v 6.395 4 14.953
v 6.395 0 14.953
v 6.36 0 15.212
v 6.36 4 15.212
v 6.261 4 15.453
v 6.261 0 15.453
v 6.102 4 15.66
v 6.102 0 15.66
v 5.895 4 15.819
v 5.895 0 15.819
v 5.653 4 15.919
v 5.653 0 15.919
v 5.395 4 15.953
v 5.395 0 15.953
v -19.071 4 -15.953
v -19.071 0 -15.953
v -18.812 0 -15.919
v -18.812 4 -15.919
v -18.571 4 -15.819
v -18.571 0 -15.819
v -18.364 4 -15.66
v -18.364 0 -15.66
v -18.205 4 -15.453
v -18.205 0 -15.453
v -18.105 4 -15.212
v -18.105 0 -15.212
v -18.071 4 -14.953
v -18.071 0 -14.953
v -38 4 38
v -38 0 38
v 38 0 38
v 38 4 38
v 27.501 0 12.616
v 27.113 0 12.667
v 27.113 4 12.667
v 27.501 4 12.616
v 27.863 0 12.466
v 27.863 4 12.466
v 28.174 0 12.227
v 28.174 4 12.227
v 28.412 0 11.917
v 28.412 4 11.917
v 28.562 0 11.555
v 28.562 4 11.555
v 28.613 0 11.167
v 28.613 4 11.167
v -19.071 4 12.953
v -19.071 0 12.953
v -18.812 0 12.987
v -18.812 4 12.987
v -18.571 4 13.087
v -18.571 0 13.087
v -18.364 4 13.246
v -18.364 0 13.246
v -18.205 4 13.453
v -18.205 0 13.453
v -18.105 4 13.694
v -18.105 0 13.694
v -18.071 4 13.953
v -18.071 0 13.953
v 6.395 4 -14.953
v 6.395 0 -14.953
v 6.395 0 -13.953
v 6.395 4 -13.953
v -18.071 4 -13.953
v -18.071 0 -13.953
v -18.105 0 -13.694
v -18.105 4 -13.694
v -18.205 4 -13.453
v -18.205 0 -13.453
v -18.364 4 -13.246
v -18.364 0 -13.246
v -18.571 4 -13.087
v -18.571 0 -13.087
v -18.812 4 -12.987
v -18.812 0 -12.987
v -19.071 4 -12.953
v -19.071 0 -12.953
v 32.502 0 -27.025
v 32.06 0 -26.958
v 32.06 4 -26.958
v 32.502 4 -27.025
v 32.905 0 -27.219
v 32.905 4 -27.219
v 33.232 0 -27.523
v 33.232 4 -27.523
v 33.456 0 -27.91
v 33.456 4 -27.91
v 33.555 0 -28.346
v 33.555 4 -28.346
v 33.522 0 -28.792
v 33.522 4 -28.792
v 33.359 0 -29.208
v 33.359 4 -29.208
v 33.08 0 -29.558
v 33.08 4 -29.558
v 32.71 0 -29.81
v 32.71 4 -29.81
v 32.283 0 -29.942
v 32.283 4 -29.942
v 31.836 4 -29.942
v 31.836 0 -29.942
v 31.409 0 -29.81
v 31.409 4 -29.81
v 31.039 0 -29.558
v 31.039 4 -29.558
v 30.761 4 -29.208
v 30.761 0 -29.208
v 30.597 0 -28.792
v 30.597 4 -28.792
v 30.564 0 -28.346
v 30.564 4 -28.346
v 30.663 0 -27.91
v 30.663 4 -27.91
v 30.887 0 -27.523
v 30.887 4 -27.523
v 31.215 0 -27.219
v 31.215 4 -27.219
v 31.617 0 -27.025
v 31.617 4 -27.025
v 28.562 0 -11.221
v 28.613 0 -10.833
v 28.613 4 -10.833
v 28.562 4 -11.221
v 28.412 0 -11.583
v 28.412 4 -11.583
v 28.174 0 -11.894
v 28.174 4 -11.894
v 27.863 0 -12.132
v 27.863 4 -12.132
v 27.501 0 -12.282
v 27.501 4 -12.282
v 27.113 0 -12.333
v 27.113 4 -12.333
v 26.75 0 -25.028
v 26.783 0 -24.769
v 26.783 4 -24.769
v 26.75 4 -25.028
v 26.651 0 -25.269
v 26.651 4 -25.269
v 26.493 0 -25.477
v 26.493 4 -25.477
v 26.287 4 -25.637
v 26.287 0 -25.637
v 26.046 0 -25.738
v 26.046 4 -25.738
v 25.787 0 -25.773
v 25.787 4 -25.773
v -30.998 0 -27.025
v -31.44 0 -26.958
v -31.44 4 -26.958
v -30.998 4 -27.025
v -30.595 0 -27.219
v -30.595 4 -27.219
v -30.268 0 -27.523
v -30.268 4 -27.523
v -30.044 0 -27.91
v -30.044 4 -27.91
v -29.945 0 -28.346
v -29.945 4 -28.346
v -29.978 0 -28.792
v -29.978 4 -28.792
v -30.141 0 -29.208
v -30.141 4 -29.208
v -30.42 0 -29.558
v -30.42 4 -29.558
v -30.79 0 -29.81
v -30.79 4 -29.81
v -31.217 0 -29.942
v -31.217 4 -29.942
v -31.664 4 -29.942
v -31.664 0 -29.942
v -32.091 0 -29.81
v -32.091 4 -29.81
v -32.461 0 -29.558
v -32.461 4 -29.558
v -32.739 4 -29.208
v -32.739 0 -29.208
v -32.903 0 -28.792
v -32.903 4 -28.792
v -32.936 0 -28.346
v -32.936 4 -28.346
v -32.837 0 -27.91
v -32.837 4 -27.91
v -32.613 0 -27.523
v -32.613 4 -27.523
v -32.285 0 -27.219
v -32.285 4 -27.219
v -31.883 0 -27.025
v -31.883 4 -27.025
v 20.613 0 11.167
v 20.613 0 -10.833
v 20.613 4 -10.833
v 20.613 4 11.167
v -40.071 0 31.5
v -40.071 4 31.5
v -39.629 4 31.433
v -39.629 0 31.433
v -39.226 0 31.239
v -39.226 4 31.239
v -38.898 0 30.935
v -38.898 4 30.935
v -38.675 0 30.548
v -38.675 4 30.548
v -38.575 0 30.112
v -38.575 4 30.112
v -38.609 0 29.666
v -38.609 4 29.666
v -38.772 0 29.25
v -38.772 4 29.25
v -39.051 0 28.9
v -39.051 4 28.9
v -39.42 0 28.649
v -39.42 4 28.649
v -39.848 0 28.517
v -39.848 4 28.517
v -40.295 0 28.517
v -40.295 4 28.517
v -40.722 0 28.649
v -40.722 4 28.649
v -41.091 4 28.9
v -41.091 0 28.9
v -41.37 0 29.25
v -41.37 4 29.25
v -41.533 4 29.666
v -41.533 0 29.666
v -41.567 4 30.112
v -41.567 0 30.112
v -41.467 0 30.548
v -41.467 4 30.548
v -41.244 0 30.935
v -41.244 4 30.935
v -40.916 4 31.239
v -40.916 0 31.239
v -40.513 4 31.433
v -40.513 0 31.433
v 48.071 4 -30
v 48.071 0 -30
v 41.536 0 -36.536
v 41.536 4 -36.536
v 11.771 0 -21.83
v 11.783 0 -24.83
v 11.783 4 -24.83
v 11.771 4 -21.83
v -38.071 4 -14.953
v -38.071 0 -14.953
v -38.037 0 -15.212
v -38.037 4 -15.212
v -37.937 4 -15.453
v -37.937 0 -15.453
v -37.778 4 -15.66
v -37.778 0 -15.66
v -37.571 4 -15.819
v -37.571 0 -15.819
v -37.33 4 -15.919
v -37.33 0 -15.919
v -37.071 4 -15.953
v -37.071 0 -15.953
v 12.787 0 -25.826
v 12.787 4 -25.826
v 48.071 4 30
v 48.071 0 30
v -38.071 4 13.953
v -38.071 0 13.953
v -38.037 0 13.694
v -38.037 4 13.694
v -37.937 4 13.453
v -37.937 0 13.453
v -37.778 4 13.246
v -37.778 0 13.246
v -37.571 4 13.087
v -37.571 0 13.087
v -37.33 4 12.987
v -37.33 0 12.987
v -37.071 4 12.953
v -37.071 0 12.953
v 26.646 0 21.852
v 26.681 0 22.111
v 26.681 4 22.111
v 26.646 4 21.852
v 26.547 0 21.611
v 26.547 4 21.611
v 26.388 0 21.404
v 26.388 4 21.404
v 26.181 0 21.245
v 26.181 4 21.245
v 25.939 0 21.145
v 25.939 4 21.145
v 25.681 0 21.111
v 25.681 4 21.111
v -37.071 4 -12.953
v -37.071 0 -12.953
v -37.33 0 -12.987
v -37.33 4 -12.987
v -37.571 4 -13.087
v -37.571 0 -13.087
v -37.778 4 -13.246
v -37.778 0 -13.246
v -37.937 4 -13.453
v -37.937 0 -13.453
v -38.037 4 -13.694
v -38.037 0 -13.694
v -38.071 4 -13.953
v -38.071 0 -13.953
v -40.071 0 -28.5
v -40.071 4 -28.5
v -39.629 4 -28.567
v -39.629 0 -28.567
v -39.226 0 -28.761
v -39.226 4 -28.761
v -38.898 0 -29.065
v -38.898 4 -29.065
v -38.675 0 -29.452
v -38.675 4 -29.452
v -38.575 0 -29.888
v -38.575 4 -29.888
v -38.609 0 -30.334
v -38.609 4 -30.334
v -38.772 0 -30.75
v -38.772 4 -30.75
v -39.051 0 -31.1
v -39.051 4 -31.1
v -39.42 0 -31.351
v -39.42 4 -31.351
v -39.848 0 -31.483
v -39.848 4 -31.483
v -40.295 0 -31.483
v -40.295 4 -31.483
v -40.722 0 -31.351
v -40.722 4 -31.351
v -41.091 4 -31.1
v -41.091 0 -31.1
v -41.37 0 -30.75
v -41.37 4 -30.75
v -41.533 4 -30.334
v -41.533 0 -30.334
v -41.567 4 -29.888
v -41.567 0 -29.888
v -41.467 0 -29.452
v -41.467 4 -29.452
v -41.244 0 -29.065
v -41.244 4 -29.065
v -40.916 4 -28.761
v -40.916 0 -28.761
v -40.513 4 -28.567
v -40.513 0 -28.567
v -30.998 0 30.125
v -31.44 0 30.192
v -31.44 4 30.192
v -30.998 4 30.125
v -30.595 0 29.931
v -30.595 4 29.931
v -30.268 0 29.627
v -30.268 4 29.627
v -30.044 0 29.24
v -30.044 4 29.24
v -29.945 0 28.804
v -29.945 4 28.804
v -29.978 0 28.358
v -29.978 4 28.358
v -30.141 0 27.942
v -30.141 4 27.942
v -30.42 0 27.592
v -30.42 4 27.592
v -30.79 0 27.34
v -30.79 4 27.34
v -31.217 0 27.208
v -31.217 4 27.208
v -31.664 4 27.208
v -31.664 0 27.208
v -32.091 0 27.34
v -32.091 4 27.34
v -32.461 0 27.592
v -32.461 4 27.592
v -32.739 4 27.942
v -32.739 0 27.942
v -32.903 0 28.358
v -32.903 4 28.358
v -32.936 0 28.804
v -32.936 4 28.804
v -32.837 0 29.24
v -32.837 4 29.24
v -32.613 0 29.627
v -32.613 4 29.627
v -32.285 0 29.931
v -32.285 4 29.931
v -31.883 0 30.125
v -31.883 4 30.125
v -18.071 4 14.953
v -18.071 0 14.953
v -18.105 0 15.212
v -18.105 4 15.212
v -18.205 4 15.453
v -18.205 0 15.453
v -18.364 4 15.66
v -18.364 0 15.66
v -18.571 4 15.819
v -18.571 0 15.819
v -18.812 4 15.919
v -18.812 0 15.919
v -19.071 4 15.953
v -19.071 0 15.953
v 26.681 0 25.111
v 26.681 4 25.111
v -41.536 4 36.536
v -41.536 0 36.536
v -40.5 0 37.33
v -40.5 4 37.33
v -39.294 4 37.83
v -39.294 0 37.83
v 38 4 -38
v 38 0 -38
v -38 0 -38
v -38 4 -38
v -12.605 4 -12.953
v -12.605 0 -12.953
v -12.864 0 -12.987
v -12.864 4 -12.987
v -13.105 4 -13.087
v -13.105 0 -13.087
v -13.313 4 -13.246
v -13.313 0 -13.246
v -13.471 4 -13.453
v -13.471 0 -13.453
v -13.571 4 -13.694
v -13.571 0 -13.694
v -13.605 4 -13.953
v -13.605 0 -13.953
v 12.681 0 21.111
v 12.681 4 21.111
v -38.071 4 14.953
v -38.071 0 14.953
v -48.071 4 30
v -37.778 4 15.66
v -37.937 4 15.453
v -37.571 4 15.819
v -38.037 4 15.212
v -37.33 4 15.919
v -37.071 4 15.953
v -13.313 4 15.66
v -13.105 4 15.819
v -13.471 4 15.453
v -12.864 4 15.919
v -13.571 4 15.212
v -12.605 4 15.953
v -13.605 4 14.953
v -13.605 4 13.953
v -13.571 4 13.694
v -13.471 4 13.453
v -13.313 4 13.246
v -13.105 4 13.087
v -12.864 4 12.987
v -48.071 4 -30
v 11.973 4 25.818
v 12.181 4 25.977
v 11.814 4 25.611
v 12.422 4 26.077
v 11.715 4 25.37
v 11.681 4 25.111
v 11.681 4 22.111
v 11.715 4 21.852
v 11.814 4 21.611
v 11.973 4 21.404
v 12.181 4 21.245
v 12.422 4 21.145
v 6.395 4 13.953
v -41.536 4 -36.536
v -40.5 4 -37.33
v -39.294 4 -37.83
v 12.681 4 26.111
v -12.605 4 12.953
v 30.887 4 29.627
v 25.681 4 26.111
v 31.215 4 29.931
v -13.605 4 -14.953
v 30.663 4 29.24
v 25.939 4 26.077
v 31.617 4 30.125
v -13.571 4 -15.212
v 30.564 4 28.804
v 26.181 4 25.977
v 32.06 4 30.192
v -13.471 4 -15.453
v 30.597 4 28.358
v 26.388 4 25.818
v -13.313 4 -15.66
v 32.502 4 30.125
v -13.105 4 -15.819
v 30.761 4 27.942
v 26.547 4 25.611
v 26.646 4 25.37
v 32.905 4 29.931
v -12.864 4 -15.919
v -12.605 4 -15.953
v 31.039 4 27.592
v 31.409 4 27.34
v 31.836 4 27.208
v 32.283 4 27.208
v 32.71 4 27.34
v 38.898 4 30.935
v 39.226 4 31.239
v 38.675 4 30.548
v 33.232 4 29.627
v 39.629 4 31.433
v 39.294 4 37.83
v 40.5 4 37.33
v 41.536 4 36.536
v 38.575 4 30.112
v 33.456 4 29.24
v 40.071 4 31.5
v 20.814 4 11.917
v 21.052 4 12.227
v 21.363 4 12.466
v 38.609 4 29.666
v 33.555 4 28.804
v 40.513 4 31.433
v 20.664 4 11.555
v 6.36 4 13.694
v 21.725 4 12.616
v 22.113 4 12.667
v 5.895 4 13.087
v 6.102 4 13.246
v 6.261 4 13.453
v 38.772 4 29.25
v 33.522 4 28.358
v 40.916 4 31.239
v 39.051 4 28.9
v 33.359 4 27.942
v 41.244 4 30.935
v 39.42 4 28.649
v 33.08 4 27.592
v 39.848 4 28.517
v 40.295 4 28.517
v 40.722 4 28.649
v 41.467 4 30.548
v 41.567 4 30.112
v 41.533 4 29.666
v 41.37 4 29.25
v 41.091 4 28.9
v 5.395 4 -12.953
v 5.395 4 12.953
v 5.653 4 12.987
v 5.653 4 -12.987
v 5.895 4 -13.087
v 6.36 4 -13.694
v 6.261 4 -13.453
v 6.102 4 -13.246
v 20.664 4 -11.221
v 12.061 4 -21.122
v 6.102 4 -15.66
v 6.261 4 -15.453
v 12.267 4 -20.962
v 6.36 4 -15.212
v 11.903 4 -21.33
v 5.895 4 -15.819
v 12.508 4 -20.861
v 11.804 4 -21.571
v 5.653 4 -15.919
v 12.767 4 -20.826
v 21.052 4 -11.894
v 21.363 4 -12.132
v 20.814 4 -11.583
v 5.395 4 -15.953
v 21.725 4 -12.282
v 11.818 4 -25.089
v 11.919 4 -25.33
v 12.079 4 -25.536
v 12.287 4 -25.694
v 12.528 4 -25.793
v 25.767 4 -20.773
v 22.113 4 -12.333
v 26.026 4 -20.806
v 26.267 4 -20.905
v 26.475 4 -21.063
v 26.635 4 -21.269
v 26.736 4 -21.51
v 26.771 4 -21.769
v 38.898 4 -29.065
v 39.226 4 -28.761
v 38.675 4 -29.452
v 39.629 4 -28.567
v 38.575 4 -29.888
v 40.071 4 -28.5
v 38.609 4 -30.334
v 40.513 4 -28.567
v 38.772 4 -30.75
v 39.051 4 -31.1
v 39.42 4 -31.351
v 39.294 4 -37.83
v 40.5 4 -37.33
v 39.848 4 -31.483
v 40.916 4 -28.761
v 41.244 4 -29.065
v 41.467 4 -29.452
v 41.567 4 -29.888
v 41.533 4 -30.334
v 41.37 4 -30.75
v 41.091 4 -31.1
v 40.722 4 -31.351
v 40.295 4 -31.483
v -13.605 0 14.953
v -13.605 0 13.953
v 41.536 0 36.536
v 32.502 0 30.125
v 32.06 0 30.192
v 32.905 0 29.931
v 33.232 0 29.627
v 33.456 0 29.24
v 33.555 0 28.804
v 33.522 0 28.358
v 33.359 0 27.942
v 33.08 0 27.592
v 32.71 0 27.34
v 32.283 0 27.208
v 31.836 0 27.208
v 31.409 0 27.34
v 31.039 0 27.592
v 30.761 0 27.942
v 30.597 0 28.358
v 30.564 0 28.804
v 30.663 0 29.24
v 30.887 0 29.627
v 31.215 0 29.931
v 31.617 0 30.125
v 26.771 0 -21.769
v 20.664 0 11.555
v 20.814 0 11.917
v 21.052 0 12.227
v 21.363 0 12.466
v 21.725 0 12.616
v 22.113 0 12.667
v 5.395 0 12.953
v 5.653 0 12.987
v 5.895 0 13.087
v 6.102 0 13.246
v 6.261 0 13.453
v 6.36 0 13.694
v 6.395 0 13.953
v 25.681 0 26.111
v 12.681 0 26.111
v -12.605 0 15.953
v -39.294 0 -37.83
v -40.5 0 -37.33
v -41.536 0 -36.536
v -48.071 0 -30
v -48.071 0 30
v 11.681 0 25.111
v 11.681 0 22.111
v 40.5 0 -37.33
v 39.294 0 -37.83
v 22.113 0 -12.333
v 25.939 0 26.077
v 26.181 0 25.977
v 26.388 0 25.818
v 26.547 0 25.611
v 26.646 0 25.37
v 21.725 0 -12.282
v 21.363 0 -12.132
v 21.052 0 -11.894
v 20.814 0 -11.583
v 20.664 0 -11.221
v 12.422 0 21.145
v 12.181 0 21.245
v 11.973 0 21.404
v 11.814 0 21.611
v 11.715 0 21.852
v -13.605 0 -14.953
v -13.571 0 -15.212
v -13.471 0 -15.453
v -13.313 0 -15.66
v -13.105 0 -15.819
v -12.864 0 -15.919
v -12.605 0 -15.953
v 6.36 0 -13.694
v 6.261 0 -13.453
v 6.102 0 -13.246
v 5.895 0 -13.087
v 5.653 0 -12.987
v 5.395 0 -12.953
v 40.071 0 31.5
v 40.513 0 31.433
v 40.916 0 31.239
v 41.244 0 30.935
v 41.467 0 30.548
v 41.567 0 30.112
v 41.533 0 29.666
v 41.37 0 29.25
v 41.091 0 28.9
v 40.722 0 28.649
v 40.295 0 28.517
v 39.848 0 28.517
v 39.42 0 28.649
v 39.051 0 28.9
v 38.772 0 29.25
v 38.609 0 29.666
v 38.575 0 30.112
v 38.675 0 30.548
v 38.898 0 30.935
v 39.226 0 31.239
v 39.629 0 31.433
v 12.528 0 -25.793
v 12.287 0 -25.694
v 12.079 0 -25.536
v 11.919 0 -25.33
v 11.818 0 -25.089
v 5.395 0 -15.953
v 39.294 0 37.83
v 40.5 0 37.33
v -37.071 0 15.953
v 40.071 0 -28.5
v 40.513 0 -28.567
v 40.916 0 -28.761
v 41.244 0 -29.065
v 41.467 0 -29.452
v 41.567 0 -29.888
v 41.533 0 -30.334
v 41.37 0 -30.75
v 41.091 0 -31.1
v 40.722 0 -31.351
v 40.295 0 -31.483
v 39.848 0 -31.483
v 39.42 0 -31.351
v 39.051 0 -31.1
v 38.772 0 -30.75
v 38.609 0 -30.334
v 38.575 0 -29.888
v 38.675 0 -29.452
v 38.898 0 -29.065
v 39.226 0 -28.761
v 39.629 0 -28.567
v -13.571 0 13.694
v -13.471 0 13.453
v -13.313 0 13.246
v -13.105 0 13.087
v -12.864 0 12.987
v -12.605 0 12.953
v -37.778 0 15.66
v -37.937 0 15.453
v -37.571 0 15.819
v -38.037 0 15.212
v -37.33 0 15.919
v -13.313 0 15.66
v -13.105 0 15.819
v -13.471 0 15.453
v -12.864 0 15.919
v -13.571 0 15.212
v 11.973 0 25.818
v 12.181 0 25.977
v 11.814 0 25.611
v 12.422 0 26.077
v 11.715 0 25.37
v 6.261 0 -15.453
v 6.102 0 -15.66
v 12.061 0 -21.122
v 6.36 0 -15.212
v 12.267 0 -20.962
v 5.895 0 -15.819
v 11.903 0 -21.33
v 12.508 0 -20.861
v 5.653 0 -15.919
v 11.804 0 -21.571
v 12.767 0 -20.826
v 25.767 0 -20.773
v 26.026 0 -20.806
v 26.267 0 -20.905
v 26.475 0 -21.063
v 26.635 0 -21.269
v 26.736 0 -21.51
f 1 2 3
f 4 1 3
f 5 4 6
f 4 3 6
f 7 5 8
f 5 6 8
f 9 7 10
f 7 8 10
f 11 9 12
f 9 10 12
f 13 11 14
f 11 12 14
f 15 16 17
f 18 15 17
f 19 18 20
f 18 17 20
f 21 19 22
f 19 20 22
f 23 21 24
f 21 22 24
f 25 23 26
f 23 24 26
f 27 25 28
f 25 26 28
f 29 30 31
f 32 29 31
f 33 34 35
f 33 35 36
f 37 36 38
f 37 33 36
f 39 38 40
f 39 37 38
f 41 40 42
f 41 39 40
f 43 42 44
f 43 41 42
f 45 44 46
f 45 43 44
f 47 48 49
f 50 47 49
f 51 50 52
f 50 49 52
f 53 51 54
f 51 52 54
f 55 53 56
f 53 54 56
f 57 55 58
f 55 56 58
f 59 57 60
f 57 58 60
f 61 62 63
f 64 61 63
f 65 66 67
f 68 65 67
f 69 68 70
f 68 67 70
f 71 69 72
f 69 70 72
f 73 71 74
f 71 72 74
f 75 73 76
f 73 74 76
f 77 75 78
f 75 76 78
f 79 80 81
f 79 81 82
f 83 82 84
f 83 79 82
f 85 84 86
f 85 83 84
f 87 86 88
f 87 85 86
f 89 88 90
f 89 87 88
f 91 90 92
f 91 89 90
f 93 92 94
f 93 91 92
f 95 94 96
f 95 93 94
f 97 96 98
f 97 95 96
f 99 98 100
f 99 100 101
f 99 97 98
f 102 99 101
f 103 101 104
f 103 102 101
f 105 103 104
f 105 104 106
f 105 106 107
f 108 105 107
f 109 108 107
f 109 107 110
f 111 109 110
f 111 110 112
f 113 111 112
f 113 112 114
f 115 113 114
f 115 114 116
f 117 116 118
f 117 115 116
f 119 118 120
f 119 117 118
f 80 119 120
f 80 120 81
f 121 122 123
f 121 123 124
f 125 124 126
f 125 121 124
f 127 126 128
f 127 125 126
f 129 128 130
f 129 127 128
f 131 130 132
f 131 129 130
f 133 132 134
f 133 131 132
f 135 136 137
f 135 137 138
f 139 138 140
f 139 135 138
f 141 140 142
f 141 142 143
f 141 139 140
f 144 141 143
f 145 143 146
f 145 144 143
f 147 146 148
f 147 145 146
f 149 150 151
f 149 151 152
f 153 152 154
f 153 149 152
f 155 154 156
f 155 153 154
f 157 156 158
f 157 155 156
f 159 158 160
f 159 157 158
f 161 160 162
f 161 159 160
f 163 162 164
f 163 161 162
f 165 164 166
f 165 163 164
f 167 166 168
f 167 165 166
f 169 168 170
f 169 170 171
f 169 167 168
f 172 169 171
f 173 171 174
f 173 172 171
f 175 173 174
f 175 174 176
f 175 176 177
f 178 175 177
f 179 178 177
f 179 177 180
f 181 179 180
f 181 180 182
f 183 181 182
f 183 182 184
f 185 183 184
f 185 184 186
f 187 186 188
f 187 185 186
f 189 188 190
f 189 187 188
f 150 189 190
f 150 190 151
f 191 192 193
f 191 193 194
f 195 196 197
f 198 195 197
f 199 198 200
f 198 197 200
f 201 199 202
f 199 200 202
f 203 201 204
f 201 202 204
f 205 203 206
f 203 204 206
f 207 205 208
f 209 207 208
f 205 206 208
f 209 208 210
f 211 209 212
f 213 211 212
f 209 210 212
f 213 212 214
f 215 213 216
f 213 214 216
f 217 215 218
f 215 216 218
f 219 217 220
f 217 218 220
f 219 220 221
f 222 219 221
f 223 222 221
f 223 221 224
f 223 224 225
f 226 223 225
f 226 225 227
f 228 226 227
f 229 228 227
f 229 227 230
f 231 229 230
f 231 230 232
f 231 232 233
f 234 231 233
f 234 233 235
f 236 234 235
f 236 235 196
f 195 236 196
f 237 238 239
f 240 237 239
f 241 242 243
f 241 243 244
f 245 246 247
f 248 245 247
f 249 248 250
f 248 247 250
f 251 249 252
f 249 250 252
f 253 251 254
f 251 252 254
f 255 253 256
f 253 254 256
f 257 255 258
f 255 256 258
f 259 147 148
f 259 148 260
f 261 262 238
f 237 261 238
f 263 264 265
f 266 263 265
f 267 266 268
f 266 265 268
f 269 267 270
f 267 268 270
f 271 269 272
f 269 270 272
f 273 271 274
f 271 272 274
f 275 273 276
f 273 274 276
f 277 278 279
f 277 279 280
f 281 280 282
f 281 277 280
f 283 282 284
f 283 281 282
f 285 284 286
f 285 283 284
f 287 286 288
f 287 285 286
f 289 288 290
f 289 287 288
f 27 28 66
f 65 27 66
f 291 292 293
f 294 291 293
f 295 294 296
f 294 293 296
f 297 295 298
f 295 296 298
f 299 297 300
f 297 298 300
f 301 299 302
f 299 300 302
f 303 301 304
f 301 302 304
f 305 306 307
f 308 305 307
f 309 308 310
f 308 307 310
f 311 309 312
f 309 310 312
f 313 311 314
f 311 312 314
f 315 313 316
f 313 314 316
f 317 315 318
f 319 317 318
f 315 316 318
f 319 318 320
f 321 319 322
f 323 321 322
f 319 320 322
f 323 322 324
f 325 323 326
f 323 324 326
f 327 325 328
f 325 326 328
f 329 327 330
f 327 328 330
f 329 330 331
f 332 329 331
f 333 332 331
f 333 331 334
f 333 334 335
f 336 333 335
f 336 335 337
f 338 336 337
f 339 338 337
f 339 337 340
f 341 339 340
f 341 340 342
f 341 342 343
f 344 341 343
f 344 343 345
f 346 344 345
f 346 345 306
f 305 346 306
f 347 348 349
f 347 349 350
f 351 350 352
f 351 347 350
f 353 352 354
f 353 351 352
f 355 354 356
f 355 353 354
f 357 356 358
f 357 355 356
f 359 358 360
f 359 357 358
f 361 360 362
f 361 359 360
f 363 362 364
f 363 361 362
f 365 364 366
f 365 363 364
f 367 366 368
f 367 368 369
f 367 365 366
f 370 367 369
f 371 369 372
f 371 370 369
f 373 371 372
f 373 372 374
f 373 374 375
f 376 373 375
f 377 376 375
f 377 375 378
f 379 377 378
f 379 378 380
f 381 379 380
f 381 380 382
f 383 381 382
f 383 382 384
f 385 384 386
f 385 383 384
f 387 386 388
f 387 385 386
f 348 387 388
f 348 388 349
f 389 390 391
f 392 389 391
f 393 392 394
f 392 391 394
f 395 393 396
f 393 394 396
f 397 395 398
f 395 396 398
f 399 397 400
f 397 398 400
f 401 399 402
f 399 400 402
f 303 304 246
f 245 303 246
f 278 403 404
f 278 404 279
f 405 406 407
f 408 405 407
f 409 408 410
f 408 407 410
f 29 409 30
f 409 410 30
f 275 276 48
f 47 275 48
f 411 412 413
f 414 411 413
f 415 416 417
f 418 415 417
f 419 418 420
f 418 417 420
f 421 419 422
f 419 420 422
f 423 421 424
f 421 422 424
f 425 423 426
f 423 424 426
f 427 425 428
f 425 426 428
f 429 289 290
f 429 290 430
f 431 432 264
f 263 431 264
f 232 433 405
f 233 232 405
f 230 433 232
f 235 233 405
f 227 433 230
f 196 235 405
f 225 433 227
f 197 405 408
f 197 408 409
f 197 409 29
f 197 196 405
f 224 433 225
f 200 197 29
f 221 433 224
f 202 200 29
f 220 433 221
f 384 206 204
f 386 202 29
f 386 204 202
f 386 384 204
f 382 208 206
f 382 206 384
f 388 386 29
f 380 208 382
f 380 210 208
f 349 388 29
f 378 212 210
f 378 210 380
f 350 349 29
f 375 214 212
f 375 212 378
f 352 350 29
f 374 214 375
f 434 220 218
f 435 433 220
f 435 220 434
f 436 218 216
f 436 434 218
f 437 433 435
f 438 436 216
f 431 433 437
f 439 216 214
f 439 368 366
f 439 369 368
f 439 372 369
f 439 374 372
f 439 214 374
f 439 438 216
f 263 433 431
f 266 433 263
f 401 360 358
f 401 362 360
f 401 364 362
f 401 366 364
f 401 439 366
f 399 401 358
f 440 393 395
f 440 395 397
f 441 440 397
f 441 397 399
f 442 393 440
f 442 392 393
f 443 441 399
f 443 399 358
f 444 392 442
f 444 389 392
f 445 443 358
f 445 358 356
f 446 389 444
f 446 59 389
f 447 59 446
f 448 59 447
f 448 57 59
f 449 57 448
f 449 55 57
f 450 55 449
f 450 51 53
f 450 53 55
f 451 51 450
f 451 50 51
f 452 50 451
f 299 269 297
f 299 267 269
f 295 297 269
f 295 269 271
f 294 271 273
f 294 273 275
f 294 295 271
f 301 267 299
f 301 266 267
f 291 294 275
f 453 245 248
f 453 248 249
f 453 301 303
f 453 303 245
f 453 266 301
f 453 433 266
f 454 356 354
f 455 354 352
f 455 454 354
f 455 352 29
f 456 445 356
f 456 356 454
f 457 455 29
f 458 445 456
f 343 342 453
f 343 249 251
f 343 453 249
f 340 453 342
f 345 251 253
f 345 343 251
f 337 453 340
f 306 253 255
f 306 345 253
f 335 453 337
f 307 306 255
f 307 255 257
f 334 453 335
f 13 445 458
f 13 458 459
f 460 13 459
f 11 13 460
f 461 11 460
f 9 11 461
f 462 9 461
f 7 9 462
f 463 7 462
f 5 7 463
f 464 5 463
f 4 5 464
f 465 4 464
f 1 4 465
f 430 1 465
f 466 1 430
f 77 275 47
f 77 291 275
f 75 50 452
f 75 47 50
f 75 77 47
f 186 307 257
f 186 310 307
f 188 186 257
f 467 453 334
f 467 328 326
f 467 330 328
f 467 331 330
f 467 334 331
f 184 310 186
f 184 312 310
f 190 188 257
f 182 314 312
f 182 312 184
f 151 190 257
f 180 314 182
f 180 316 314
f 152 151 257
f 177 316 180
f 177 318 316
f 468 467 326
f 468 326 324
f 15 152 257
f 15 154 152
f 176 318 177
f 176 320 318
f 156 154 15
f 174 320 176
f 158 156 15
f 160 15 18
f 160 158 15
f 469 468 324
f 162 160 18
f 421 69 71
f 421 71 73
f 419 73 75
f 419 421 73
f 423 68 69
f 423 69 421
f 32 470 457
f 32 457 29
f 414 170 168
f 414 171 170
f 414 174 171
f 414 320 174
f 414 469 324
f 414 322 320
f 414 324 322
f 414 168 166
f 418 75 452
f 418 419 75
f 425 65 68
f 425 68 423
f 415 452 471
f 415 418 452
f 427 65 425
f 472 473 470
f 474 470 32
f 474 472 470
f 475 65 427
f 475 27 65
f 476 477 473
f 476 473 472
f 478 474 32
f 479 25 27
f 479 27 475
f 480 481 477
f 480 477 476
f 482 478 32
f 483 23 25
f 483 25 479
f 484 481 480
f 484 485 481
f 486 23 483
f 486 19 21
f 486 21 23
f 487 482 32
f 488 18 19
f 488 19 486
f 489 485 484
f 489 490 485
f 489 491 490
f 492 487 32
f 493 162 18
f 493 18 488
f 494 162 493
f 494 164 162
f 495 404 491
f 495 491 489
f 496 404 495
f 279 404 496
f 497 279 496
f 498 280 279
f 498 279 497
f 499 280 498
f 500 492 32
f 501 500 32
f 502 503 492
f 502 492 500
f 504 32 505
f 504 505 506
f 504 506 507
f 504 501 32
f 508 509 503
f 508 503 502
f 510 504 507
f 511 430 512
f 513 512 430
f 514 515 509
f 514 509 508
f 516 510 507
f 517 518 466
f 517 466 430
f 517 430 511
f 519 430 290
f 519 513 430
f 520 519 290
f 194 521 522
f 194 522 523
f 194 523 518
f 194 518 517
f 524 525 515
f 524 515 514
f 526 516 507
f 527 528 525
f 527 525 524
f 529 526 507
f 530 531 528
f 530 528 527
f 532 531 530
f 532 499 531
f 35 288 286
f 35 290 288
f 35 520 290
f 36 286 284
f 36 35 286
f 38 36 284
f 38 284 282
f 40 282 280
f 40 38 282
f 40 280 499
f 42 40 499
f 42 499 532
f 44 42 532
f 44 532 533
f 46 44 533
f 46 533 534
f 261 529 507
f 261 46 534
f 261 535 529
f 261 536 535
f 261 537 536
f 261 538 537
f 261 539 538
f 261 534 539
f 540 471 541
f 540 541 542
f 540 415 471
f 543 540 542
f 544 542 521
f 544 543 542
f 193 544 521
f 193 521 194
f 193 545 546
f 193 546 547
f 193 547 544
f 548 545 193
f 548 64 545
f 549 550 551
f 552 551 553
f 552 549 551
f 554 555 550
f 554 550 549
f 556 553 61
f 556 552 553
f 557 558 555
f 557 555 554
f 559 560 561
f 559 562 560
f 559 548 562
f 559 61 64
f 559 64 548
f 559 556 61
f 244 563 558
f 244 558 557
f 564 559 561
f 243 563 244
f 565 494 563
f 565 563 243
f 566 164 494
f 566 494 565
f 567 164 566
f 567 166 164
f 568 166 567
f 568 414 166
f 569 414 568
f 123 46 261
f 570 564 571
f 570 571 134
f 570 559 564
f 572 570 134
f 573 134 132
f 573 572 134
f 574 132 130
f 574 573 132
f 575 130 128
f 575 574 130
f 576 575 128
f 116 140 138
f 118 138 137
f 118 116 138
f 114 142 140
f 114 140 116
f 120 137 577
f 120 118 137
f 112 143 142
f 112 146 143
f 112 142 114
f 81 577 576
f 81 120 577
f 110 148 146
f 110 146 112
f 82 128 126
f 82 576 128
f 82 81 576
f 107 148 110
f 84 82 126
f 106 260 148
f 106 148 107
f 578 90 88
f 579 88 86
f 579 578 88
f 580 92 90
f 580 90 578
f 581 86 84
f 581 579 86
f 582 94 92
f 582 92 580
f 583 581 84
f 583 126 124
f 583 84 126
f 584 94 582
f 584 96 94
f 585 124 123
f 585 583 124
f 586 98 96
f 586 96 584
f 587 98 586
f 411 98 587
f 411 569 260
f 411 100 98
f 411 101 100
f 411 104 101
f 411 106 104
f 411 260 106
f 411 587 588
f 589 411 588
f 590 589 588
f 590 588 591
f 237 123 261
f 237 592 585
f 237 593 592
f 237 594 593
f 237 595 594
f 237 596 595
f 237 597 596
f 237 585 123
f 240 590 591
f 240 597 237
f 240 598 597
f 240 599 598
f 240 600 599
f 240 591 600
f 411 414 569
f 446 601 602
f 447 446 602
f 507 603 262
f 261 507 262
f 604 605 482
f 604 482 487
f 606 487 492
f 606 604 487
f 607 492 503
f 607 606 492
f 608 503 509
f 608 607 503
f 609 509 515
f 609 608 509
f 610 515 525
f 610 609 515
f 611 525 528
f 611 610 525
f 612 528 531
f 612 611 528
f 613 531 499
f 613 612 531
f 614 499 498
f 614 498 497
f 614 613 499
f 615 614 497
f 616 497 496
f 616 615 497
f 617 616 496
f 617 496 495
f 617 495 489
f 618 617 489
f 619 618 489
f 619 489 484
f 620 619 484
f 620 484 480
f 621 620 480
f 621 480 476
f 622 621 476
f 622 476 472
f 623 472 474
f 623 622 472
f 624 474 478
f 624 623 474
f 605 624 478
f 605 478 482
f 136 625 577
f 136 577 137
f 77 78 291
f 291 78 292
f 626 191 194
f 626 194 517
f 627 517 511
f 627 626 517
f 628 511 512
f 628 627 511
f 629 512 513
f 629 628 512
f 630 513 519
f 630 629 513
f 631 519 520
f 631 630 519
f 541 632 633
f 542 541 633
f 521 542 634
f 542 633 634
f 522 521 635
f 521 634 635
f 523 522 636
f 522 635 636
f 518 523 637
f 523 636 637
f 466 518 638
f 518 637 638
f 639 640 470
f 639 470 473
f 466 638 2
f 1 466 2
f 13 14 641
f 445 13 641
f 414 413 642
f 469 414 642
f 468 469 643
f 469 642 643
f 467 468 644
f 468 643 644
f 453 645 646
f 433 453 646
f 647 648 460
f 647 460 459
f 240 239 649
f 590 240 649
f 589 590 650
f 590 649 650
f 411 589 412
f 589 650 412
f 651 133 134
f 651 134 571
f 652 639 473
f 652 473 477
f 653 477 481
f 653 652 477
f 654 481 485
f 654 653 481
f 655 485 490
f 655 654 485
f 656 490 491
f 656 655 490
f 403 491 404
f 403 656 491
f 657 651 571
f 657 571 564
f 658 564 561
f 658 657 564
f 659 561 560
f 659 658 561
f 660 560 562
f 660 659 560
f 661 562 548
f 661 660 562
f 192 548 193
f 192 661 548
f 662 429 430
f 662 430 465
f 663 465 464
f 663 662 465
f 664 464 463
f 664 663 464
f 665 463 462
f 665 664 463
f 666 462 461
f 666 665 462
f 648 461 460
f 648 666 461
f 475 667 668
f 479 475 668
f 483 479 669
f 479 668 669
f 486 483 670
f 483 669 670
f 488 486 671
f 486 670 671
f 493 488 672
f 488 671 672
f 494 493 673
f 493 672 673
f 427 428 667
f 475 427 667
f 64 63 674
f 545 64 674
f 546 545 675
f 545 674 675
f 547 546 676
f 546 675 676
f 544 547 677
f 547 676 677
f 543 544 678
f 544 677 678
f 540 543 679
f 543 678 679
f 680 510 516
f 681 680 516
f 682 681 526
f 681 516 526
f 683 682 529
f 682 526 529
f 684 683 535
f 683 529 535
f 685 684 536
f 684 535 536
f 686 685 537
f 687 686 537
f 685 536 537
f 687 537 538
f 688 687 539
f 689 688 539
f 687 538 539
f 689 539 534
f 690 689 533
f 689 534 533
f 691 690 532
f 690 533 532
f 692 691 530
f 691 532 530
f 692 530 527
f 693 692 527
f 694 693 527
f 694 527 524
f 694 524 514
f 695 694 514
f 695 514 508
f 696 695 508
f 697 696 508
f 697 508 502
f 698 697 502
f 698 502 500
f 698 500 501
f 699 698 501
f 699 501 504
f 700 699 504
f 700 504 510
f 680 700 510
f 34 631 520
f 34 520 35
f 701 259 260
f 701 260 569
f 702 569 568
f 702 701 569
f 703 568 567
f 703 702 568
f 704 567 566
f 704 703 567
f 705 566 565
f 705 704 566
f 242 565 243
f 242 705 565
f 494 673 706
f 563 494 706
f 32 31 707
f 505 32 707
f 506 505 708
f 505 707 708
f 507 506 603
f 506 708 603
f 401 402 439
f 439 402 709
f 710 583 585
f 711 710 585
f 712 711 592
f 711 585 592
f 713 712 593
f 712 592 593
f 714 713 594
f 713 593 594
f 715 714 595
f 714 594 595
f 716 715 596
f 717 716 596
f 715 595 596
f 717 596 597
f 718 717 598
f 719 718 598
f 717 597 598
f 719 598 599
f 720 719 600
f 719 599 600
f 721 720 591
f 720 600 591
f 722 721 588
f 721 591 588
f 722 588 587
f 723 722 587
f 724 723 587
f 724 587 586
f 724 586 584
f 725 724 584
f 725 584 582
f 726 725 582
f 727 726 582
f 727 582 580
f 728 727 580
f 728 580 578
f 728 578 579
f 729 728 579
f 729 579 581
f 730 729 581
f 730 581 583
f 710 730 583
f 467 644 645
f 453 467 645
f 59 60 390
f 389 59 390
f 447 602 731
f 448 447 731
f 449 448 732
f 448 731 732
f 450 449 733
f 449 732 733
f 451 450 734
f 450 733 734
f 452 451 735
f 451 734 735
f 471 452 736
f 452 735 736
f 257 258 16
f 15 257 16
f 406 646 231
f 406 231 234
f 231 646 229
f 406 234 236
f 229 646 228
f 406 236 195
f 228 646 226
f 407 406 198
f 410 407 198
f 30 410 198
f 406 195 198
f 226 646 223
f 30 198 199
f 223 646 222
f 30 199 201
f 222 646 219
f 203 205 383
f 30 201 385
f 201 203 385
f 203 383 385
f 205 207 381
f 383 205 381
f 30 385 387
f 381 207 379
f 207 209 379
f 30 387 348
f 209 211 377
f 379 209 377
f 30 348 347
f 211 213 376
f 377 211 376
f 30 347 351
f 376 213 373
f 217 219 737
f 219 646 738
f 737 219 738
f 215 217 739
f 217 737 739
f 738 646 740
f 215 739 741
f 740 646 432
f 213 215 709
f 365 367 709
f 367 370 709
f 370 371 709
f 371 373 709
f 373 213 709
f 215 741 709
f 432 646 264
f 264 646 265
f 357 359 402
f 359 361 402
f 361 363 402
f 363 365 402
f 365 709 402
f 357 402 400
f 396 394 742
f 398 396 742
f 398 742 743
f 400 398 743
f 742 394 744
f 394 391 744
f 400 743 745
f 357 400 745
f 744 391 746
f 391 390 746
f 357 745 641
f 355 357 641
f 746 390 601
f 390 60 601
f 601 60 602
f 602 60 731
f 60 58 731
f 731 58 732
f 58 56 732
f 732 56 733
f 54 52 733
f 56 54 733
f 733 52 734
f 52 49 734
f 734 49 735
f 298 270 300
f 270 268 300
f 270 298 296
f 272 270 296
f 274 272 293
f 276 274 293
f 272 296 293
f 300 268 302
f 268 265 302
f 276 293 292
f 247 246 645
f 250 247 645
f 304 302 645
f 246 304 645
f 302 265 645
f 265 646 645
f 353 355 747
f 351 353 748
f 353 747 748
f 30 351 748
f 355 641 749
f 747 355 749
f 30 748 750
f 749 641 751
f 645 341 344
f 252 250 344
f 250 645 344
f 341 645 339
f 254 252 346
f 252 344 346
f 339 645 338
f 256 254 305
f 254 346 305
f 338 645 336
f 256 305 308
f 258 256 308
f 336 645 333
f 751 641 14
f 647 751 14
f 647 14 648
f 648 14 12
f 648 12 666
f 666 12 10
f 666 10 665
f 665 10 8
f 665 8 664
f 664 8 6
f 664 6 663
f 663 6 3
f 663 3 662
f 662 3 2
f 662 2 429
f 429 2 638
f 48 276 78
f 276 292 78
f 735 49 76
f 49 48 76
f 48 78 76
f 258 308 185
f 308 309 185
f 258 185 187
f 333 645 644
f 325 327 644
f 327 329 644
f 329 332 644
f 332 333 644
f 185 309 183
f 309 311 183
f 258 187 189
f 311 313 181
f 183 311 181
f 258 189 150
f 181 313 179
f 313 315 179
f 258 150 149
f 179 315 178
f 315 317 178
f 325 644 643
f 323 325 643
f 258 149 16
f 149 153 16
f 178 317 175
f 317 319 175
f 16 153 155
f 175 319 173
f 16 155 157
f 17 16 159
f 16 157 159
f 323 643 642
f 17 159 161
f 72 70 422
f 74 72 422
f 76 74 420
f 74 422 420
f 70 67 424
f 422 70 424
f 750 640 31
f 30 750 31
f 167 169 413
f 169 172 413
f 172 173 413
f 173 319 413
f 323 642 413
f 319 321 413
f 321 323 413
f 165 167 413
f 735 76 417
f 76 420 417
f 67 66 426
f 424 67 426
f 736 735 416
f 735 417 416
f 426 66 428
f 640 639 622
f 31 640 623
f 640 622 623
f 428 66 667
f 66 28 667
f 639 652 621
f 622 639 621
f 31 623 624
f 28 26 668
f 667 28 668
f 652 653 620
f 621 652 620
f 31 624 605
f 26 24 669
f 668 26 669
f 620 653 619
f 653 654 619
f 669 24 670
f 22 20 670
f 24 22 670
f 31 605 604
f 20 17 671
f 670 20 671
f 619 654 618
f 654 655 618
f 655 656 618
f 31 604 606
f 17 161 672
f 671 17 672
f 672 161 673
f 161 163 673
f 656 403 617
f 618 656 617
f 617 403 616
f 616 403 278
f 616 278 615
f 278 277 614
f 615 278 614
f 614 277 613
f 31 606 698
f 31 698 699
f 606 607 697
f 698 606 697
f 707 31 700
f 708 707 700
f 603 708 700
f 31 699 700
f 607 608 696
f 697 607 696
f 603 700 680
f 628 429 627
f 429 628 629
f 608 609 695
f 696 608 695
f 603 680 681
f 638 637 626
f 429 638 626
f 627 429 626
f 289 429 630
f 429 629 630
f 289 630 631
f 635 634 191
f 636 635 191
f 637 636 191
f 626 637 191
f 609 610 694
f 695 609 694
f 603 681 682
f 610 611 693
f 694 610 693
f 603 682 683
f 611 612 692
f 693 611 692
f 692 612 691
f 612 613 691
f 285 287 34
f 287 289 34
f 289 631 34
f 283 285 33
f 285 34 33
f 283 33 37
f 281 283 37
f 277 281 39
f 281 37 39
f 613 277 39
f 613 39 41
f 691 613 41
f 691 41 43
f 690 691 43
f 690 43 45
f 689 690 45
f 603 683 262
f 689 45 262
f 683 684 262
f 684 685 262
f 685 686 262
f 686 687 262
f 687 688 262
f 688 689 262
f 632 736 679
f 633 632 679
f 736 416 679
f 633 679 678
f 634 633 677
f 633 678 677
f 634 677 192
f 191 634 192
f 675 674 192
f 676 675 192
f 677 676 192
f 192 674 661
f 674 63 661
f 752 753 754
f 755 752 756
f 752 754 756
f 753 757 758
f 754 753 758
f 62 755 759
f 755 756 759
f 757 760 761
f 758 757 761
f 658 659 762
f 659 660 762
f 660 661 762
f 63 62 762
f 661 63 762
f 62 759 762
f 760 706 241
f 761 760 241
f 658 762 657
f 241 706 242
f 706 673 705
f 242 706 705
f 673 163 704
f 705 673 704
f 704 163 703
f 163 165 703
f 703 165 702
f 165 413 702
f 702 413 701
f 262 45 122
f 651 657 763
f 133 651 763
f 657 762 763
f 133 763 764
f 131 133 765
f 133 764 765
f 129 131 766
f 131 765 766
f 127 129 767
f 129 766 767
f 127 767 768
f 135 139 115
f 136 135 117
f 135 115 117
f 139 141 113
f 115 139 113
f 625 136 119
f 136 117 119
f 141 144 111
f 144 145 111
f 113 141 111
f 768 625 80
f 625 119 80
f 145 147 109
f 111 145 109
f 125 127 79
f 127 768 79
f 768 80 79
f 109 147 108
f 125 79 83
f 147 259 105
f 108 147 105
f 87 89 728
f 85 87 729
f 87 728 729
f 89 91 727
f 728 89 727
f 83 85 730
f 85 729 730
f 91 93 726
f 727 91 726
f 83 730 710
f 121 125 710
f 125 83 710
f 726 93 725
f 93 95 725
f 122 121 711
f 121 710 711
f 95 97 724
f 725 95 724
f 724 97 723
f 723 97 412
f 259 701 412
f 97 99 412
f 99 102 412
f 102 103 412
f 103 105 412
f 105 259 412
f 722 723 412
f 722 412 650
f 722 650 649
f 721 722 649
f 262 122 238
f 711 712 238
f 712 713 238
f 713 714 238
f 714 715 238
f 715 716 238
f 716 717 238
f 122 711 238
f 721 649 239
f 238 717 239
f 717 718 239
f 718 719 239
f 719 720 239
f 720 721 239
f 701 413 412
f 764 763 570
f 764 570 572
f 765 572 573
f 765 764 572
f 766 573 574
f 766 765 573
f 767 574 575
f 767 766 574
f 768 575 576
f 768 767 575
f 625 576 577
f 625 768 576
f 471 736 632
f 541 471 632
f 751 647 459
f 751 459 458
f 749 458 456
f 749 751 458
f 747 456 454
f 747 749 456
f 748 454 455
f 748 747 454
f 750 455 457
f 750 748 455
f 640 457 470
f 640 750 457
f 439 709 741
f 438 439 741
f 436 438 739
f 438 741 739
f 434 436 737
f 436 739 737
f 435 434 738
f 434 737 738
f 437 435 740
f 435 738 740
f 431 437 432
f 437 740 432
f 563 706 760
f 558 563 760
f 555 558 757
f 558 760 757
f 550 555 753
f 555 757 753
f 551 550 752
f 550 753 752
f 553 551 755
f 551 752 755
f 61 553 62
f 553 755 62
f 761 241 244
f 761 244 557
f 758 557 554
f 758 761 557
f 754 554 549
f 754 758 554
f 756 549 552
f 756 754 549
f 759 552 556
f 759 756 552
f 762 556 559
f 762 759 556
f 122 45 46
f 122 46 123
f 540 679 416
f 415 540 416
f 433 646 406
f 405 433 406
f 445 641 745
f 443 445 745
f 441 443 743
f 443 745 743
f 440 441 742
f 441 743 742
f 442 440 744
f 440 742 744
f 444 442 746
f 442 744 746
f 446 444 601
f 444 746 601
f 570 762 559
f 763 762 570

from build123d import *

# Parameters (mm, degrees)
SKETCH1_R           = 1.5
BOSS_EXTRUDE1_DEPTH = 4
SKETCH2_R           = 1.5
CUT_EXTRUDE1_DEPTH  = 10


with BuildPart() as part:
    # Sketch1 → Boss-Extrude1 (new body)
    with BuildSketch(Plane(origin=(0, 0, 0), x_dir=(1, 0, 0), z_dir=(0, 1, 0))):
        with BuildLine():
            Line((-48.071067812, 30), (-48.071067812, -30))
            Line((-48.071067812, -30), (-41.535533906, -36.535533906))
            ThreePointArc((-41.535533906, -36.535533906), (-39.913417162, -37.619397663), (-38, -38))
            Line((-38, -38), (38, -38))
            ThreePointArc((38, -38), (39.913417162, -37.619397663), (41.535533906, -36.535533906))
            Line((41.535533906, -36.535533906), (48.071067812, -30))
            Line((48.071067812, -30), (48.071067812, 30))
            Line((48.071067812, 30), (41.535533906, 36.535533906))
            ThreePointArc((41.535533906, 36.535533906), (39.913417162, 37.619397663), (38, 38))
            Line((38, 38), (-38, 38))
            ThreePointArc((-38, 38), (-39.913417162, 37.619397663), (-41.535533906, 36.535533906))
            Line((-41.535533906, 36.535533906), (-48.071067812, 30))
        make_face()
        with Locations(Location((32.059596398, -28.691611003, 0), (0, 0, 270))):
            Circle(SKETCH1_R, mode=Mode.SUBTRACT)
        with Locations(Location((32.059596398, 28.458388997, 0), (0, 0, 270))):
            Circle(SKETCH1_R, mode=Mode.SUBTRACT)
        with Locations(Location((-31.440403602, -28.691611003, 0), (0, 0, 270))):
            Circle(SKETCH1_R, mode=Mode.SUBTRACT)
        with Locations(Location((-31.440403602, 28.458388997, 0), (0, 0, 270))):
            Circle(SKETCH1_R, mode=Mode.SUBTRACT)
        with BuildLine():
            Line((26.770818028, 21.768665175), (26.783167828, 24.768639755))
            ThreePointArc((26.783167828, 24.768639755), (26.493187967, 25.476946269), (25.787292902, 25.772747882))
            Line((25.787292902, 25.772747882), (12.787403054, 25.826263684))
            ThreePointArc((12.787403054, 25.826263684), (12.07909654, 25.536283823), (11.783294927, 24.830388757))
            Line((11.783294927, 24.830388757), (11.770945126, 21.830414177))
            ThreePointArc((11.770945126, 21.830414177), (12.060924988, 21.122107663), (12.766820053, 20.82630605))
            Line((12.766820053, 20.82630605), (25.766709901, 20.772790248))
            ThreePointArc((25.766709901, 20.772790248), (26.475016415, 21.062770109), (26.770818028, 21.768665175))
        make_face(mode=Mode.SUBTRACT)
        with BuildLine():
            Line((28.613064126, -11.166765747), (28.613064126, 10.833234253))
            ThreePointArc((28.613064126, 10.833234253), (28.173724298, 11.893894425), (27.113064126, 12.333234253))
            Line((27.113064126, 12.333234253), (22.113064126, 12.333234253))
            ThreePointArc((22.113064126, 12.333234253), (21.052403954, 11.893894425), (20.613064126, 10.833234253))
            Line((20.613064126, 10.833234253), (20.613064126, -11.166765747))
            ThreePointArc((20.613064126, -11.166765747), (21.052403954, -12.227425919), (22.113064126, -12.666765747))
            Line((22.113064126, -12.666765747), (27.113064126, -12.666765747))
            ThreePointArc((27.113064126, -12.666765747), (28.173724298, -12.227425919), (28.613064126, -11.166765747))
        make_face(mode=Mode.SUBTRACT)
        with BuildLine():
            Line((26.680500347, -25.110893415), (26.680500347, -22.110893415))
            ThreePointArc((26.680500347, -22.110893415), (26.387607128, -21.403786634), (25.680500347, -21.110893415))
            Line((25.680500347, -21.110893415), (12.680500347, -21.110893415))
            ThreePointArc((12.680500347, -21.110893415), (11.973393565, -21.403786634), (11.680500347, -22.110893415))
            Line((11.680500347, -22.110893415), (11.680500347, -25.110893415))
            ThreePointArc((11.680500347, -25.110893415), (11.973393565, -25.818000196), (12.680500347, -26.110893415))
            Line((12.680500347, -26.110893415), (25.680500347, -26.110893415))
            ThreePointArc((25.680500347, -26.110893415), (26.387607128, -25.818000196), (26.680500347, -25.110893415))
        make_face(mode=Mode.SUBTRACT)
        with BuildLine():
            Line((-37.071067812, 15.952856913), (-19.071067812, 15.952856913))
            ThreePointArc((-19.071067812, 15.952856913), (-18.363961031, 15.659963694), (-18.071067812, 14.952856913))
            Line((-18.071067812, 14.952856913), (-18.071067812, 13.952856913))
            ThreePointArc((-18.071067812, 13.952856913), (-18.363961031, 13.245750131), (-19.071067812, 12.952856913))
            Line((-19.071067812, 12.952856913), (-37.071067812, 12.952856913))
            ThreePointArc((-37.071067812, 12.952856913), (-37.778174593, 13.245750131), (-38.071067812, 13.952856913))
            Line((-38.071067812, 13.952856913), (-38.071067812, 14.952856913))
            ThreePointArc((-38.071067812, 14.952856913), (-37.778174593, 15.659963694), (-37.071067812, 15.952856913))
        make_face(mode=Mode.SUBTRACT)
        with BuildLine():
            Line((6.394530071, 14.952856913), (6.394530071, 13.952856913))
            ThreePointArc((6.394530071, 13.952856913), (6.101636852, 13.245750131), (5.394530071, 12.952856913))
            Line((5.394530071, 12.952856913), (-12.605469929, 12.952856913))
            ThreePointArc((-12.605469929, 12.952856913), (-13.312576711, 13.245750131), (-13.605469929, 13.952856913))
            Line((-13.605469929, 13.952856913), (-13.605469929, 14.952856913))
            ThreePointArc((-13.605469929, 14.952856913), (-13.312576711, 15.659963694), (-12.605469929, 15.952856913))
            Line((-12.605469929, 15.952856913), (5.394530071, 15.952856913))
            ThreePointArc((5.394530071, 15.952856913), (6.101636852, 15.659963694), (6.394530071, 14.952856913))
        make_face(mode=Mode.SUBTRACT)
        with BuildLine():
            Line((-38.071067812, -14.952856913), (-38.071067812, -13.952856913))
            ThreePointArc((-38.071067812, -13.952856913), (-37.778174593, -13.245750131), (-37.071067812, -12.952856913))
            Line((-37.071067812, -12.952856913), (-19.071067812, -12.952856913))
            ThreePointArc((-19.071067812, -12.952856913), (-18.363961031, -13.245750131), (-18.071067812, -13.952856913))
            Line((-18.071067812, -13.952856913), (-18.071067812, -14.952856913))
            ThreePointArc((-18.071067812, -14.952856913), (-18.363961031, -15.659963694), (-19.071067812, -15.952856913))
            Line((-19.071067812, -15.952856913), (-37.071067812, -15.952856913))
            ThreePointArc((-37.071067812, -15.952856913), (-37.778174593, -15.659963694), (-38.071067812, -14.952856913))
        make_face(mode=Mode.SUBTRACT)
        with BuildLine():
            Line((-13.605469929, -14.952856913), (-13.605469929, -13.952856913))
            ThreePointArc((-13.605469929, -13.952856913), (-13.312576711, -13.245750131), (-12.605469929, -12.952856913))
            Line((-12.605469929, -12.952856913), (5.394530071, -12.952856913))
            ThreePointArc((5.394530071, -12.952856913), (6.101636852, -13.245750131), (6.394530071, -13.952856913))
            Line((6.394530071, -13.952856913), (6.394530071, -14.952856913))
            ThreePointArc((6.394530071, -14.952856913), (6.101636852, -15.659963694), (5.394530071, -15.952856913))
            Line((5.394530071, -15.952856913), (-12.605469929, -15.952856913))
            ThreePointArc((-12.605469929, -15.952856913), (-13.312576711, -15.659963694), (-13.605469929, -14.952856913))
        make_face(mode=Mode.SUBTRACT)
    extrude(amount=BOSS_EXTRUDE1_DEPTH)

    # Sketch2 → Cut-Extrude1 (cut)
    with BuildSketch(Plane(origin=(0, 4, 0), x_dir=(1, 0, 0), z_dir=(0, 1, 0))):
        with Locations(Location((-40.071067812, 30, 0), (0, 0, 270))):
            Circle(SKETCH2_R)
        with Locations(Location((40.071067812, 30, 0), (0, 0, 270))):
            Circle(SKETCH2_R)
        with Locations(Location((40.071067812, -30, 0), (0, 0, 270))):
            Circle(SKETCH2_R)
        with Locations(Location((-40.071067812, -30, 0), (0, 0, 270))):
            Circle(SKETCH2_R)
    extrude(amount=-CUT_EXTRUDE1_DEPTH, mode=Mode.SUBTRACT)


solid = part.part
